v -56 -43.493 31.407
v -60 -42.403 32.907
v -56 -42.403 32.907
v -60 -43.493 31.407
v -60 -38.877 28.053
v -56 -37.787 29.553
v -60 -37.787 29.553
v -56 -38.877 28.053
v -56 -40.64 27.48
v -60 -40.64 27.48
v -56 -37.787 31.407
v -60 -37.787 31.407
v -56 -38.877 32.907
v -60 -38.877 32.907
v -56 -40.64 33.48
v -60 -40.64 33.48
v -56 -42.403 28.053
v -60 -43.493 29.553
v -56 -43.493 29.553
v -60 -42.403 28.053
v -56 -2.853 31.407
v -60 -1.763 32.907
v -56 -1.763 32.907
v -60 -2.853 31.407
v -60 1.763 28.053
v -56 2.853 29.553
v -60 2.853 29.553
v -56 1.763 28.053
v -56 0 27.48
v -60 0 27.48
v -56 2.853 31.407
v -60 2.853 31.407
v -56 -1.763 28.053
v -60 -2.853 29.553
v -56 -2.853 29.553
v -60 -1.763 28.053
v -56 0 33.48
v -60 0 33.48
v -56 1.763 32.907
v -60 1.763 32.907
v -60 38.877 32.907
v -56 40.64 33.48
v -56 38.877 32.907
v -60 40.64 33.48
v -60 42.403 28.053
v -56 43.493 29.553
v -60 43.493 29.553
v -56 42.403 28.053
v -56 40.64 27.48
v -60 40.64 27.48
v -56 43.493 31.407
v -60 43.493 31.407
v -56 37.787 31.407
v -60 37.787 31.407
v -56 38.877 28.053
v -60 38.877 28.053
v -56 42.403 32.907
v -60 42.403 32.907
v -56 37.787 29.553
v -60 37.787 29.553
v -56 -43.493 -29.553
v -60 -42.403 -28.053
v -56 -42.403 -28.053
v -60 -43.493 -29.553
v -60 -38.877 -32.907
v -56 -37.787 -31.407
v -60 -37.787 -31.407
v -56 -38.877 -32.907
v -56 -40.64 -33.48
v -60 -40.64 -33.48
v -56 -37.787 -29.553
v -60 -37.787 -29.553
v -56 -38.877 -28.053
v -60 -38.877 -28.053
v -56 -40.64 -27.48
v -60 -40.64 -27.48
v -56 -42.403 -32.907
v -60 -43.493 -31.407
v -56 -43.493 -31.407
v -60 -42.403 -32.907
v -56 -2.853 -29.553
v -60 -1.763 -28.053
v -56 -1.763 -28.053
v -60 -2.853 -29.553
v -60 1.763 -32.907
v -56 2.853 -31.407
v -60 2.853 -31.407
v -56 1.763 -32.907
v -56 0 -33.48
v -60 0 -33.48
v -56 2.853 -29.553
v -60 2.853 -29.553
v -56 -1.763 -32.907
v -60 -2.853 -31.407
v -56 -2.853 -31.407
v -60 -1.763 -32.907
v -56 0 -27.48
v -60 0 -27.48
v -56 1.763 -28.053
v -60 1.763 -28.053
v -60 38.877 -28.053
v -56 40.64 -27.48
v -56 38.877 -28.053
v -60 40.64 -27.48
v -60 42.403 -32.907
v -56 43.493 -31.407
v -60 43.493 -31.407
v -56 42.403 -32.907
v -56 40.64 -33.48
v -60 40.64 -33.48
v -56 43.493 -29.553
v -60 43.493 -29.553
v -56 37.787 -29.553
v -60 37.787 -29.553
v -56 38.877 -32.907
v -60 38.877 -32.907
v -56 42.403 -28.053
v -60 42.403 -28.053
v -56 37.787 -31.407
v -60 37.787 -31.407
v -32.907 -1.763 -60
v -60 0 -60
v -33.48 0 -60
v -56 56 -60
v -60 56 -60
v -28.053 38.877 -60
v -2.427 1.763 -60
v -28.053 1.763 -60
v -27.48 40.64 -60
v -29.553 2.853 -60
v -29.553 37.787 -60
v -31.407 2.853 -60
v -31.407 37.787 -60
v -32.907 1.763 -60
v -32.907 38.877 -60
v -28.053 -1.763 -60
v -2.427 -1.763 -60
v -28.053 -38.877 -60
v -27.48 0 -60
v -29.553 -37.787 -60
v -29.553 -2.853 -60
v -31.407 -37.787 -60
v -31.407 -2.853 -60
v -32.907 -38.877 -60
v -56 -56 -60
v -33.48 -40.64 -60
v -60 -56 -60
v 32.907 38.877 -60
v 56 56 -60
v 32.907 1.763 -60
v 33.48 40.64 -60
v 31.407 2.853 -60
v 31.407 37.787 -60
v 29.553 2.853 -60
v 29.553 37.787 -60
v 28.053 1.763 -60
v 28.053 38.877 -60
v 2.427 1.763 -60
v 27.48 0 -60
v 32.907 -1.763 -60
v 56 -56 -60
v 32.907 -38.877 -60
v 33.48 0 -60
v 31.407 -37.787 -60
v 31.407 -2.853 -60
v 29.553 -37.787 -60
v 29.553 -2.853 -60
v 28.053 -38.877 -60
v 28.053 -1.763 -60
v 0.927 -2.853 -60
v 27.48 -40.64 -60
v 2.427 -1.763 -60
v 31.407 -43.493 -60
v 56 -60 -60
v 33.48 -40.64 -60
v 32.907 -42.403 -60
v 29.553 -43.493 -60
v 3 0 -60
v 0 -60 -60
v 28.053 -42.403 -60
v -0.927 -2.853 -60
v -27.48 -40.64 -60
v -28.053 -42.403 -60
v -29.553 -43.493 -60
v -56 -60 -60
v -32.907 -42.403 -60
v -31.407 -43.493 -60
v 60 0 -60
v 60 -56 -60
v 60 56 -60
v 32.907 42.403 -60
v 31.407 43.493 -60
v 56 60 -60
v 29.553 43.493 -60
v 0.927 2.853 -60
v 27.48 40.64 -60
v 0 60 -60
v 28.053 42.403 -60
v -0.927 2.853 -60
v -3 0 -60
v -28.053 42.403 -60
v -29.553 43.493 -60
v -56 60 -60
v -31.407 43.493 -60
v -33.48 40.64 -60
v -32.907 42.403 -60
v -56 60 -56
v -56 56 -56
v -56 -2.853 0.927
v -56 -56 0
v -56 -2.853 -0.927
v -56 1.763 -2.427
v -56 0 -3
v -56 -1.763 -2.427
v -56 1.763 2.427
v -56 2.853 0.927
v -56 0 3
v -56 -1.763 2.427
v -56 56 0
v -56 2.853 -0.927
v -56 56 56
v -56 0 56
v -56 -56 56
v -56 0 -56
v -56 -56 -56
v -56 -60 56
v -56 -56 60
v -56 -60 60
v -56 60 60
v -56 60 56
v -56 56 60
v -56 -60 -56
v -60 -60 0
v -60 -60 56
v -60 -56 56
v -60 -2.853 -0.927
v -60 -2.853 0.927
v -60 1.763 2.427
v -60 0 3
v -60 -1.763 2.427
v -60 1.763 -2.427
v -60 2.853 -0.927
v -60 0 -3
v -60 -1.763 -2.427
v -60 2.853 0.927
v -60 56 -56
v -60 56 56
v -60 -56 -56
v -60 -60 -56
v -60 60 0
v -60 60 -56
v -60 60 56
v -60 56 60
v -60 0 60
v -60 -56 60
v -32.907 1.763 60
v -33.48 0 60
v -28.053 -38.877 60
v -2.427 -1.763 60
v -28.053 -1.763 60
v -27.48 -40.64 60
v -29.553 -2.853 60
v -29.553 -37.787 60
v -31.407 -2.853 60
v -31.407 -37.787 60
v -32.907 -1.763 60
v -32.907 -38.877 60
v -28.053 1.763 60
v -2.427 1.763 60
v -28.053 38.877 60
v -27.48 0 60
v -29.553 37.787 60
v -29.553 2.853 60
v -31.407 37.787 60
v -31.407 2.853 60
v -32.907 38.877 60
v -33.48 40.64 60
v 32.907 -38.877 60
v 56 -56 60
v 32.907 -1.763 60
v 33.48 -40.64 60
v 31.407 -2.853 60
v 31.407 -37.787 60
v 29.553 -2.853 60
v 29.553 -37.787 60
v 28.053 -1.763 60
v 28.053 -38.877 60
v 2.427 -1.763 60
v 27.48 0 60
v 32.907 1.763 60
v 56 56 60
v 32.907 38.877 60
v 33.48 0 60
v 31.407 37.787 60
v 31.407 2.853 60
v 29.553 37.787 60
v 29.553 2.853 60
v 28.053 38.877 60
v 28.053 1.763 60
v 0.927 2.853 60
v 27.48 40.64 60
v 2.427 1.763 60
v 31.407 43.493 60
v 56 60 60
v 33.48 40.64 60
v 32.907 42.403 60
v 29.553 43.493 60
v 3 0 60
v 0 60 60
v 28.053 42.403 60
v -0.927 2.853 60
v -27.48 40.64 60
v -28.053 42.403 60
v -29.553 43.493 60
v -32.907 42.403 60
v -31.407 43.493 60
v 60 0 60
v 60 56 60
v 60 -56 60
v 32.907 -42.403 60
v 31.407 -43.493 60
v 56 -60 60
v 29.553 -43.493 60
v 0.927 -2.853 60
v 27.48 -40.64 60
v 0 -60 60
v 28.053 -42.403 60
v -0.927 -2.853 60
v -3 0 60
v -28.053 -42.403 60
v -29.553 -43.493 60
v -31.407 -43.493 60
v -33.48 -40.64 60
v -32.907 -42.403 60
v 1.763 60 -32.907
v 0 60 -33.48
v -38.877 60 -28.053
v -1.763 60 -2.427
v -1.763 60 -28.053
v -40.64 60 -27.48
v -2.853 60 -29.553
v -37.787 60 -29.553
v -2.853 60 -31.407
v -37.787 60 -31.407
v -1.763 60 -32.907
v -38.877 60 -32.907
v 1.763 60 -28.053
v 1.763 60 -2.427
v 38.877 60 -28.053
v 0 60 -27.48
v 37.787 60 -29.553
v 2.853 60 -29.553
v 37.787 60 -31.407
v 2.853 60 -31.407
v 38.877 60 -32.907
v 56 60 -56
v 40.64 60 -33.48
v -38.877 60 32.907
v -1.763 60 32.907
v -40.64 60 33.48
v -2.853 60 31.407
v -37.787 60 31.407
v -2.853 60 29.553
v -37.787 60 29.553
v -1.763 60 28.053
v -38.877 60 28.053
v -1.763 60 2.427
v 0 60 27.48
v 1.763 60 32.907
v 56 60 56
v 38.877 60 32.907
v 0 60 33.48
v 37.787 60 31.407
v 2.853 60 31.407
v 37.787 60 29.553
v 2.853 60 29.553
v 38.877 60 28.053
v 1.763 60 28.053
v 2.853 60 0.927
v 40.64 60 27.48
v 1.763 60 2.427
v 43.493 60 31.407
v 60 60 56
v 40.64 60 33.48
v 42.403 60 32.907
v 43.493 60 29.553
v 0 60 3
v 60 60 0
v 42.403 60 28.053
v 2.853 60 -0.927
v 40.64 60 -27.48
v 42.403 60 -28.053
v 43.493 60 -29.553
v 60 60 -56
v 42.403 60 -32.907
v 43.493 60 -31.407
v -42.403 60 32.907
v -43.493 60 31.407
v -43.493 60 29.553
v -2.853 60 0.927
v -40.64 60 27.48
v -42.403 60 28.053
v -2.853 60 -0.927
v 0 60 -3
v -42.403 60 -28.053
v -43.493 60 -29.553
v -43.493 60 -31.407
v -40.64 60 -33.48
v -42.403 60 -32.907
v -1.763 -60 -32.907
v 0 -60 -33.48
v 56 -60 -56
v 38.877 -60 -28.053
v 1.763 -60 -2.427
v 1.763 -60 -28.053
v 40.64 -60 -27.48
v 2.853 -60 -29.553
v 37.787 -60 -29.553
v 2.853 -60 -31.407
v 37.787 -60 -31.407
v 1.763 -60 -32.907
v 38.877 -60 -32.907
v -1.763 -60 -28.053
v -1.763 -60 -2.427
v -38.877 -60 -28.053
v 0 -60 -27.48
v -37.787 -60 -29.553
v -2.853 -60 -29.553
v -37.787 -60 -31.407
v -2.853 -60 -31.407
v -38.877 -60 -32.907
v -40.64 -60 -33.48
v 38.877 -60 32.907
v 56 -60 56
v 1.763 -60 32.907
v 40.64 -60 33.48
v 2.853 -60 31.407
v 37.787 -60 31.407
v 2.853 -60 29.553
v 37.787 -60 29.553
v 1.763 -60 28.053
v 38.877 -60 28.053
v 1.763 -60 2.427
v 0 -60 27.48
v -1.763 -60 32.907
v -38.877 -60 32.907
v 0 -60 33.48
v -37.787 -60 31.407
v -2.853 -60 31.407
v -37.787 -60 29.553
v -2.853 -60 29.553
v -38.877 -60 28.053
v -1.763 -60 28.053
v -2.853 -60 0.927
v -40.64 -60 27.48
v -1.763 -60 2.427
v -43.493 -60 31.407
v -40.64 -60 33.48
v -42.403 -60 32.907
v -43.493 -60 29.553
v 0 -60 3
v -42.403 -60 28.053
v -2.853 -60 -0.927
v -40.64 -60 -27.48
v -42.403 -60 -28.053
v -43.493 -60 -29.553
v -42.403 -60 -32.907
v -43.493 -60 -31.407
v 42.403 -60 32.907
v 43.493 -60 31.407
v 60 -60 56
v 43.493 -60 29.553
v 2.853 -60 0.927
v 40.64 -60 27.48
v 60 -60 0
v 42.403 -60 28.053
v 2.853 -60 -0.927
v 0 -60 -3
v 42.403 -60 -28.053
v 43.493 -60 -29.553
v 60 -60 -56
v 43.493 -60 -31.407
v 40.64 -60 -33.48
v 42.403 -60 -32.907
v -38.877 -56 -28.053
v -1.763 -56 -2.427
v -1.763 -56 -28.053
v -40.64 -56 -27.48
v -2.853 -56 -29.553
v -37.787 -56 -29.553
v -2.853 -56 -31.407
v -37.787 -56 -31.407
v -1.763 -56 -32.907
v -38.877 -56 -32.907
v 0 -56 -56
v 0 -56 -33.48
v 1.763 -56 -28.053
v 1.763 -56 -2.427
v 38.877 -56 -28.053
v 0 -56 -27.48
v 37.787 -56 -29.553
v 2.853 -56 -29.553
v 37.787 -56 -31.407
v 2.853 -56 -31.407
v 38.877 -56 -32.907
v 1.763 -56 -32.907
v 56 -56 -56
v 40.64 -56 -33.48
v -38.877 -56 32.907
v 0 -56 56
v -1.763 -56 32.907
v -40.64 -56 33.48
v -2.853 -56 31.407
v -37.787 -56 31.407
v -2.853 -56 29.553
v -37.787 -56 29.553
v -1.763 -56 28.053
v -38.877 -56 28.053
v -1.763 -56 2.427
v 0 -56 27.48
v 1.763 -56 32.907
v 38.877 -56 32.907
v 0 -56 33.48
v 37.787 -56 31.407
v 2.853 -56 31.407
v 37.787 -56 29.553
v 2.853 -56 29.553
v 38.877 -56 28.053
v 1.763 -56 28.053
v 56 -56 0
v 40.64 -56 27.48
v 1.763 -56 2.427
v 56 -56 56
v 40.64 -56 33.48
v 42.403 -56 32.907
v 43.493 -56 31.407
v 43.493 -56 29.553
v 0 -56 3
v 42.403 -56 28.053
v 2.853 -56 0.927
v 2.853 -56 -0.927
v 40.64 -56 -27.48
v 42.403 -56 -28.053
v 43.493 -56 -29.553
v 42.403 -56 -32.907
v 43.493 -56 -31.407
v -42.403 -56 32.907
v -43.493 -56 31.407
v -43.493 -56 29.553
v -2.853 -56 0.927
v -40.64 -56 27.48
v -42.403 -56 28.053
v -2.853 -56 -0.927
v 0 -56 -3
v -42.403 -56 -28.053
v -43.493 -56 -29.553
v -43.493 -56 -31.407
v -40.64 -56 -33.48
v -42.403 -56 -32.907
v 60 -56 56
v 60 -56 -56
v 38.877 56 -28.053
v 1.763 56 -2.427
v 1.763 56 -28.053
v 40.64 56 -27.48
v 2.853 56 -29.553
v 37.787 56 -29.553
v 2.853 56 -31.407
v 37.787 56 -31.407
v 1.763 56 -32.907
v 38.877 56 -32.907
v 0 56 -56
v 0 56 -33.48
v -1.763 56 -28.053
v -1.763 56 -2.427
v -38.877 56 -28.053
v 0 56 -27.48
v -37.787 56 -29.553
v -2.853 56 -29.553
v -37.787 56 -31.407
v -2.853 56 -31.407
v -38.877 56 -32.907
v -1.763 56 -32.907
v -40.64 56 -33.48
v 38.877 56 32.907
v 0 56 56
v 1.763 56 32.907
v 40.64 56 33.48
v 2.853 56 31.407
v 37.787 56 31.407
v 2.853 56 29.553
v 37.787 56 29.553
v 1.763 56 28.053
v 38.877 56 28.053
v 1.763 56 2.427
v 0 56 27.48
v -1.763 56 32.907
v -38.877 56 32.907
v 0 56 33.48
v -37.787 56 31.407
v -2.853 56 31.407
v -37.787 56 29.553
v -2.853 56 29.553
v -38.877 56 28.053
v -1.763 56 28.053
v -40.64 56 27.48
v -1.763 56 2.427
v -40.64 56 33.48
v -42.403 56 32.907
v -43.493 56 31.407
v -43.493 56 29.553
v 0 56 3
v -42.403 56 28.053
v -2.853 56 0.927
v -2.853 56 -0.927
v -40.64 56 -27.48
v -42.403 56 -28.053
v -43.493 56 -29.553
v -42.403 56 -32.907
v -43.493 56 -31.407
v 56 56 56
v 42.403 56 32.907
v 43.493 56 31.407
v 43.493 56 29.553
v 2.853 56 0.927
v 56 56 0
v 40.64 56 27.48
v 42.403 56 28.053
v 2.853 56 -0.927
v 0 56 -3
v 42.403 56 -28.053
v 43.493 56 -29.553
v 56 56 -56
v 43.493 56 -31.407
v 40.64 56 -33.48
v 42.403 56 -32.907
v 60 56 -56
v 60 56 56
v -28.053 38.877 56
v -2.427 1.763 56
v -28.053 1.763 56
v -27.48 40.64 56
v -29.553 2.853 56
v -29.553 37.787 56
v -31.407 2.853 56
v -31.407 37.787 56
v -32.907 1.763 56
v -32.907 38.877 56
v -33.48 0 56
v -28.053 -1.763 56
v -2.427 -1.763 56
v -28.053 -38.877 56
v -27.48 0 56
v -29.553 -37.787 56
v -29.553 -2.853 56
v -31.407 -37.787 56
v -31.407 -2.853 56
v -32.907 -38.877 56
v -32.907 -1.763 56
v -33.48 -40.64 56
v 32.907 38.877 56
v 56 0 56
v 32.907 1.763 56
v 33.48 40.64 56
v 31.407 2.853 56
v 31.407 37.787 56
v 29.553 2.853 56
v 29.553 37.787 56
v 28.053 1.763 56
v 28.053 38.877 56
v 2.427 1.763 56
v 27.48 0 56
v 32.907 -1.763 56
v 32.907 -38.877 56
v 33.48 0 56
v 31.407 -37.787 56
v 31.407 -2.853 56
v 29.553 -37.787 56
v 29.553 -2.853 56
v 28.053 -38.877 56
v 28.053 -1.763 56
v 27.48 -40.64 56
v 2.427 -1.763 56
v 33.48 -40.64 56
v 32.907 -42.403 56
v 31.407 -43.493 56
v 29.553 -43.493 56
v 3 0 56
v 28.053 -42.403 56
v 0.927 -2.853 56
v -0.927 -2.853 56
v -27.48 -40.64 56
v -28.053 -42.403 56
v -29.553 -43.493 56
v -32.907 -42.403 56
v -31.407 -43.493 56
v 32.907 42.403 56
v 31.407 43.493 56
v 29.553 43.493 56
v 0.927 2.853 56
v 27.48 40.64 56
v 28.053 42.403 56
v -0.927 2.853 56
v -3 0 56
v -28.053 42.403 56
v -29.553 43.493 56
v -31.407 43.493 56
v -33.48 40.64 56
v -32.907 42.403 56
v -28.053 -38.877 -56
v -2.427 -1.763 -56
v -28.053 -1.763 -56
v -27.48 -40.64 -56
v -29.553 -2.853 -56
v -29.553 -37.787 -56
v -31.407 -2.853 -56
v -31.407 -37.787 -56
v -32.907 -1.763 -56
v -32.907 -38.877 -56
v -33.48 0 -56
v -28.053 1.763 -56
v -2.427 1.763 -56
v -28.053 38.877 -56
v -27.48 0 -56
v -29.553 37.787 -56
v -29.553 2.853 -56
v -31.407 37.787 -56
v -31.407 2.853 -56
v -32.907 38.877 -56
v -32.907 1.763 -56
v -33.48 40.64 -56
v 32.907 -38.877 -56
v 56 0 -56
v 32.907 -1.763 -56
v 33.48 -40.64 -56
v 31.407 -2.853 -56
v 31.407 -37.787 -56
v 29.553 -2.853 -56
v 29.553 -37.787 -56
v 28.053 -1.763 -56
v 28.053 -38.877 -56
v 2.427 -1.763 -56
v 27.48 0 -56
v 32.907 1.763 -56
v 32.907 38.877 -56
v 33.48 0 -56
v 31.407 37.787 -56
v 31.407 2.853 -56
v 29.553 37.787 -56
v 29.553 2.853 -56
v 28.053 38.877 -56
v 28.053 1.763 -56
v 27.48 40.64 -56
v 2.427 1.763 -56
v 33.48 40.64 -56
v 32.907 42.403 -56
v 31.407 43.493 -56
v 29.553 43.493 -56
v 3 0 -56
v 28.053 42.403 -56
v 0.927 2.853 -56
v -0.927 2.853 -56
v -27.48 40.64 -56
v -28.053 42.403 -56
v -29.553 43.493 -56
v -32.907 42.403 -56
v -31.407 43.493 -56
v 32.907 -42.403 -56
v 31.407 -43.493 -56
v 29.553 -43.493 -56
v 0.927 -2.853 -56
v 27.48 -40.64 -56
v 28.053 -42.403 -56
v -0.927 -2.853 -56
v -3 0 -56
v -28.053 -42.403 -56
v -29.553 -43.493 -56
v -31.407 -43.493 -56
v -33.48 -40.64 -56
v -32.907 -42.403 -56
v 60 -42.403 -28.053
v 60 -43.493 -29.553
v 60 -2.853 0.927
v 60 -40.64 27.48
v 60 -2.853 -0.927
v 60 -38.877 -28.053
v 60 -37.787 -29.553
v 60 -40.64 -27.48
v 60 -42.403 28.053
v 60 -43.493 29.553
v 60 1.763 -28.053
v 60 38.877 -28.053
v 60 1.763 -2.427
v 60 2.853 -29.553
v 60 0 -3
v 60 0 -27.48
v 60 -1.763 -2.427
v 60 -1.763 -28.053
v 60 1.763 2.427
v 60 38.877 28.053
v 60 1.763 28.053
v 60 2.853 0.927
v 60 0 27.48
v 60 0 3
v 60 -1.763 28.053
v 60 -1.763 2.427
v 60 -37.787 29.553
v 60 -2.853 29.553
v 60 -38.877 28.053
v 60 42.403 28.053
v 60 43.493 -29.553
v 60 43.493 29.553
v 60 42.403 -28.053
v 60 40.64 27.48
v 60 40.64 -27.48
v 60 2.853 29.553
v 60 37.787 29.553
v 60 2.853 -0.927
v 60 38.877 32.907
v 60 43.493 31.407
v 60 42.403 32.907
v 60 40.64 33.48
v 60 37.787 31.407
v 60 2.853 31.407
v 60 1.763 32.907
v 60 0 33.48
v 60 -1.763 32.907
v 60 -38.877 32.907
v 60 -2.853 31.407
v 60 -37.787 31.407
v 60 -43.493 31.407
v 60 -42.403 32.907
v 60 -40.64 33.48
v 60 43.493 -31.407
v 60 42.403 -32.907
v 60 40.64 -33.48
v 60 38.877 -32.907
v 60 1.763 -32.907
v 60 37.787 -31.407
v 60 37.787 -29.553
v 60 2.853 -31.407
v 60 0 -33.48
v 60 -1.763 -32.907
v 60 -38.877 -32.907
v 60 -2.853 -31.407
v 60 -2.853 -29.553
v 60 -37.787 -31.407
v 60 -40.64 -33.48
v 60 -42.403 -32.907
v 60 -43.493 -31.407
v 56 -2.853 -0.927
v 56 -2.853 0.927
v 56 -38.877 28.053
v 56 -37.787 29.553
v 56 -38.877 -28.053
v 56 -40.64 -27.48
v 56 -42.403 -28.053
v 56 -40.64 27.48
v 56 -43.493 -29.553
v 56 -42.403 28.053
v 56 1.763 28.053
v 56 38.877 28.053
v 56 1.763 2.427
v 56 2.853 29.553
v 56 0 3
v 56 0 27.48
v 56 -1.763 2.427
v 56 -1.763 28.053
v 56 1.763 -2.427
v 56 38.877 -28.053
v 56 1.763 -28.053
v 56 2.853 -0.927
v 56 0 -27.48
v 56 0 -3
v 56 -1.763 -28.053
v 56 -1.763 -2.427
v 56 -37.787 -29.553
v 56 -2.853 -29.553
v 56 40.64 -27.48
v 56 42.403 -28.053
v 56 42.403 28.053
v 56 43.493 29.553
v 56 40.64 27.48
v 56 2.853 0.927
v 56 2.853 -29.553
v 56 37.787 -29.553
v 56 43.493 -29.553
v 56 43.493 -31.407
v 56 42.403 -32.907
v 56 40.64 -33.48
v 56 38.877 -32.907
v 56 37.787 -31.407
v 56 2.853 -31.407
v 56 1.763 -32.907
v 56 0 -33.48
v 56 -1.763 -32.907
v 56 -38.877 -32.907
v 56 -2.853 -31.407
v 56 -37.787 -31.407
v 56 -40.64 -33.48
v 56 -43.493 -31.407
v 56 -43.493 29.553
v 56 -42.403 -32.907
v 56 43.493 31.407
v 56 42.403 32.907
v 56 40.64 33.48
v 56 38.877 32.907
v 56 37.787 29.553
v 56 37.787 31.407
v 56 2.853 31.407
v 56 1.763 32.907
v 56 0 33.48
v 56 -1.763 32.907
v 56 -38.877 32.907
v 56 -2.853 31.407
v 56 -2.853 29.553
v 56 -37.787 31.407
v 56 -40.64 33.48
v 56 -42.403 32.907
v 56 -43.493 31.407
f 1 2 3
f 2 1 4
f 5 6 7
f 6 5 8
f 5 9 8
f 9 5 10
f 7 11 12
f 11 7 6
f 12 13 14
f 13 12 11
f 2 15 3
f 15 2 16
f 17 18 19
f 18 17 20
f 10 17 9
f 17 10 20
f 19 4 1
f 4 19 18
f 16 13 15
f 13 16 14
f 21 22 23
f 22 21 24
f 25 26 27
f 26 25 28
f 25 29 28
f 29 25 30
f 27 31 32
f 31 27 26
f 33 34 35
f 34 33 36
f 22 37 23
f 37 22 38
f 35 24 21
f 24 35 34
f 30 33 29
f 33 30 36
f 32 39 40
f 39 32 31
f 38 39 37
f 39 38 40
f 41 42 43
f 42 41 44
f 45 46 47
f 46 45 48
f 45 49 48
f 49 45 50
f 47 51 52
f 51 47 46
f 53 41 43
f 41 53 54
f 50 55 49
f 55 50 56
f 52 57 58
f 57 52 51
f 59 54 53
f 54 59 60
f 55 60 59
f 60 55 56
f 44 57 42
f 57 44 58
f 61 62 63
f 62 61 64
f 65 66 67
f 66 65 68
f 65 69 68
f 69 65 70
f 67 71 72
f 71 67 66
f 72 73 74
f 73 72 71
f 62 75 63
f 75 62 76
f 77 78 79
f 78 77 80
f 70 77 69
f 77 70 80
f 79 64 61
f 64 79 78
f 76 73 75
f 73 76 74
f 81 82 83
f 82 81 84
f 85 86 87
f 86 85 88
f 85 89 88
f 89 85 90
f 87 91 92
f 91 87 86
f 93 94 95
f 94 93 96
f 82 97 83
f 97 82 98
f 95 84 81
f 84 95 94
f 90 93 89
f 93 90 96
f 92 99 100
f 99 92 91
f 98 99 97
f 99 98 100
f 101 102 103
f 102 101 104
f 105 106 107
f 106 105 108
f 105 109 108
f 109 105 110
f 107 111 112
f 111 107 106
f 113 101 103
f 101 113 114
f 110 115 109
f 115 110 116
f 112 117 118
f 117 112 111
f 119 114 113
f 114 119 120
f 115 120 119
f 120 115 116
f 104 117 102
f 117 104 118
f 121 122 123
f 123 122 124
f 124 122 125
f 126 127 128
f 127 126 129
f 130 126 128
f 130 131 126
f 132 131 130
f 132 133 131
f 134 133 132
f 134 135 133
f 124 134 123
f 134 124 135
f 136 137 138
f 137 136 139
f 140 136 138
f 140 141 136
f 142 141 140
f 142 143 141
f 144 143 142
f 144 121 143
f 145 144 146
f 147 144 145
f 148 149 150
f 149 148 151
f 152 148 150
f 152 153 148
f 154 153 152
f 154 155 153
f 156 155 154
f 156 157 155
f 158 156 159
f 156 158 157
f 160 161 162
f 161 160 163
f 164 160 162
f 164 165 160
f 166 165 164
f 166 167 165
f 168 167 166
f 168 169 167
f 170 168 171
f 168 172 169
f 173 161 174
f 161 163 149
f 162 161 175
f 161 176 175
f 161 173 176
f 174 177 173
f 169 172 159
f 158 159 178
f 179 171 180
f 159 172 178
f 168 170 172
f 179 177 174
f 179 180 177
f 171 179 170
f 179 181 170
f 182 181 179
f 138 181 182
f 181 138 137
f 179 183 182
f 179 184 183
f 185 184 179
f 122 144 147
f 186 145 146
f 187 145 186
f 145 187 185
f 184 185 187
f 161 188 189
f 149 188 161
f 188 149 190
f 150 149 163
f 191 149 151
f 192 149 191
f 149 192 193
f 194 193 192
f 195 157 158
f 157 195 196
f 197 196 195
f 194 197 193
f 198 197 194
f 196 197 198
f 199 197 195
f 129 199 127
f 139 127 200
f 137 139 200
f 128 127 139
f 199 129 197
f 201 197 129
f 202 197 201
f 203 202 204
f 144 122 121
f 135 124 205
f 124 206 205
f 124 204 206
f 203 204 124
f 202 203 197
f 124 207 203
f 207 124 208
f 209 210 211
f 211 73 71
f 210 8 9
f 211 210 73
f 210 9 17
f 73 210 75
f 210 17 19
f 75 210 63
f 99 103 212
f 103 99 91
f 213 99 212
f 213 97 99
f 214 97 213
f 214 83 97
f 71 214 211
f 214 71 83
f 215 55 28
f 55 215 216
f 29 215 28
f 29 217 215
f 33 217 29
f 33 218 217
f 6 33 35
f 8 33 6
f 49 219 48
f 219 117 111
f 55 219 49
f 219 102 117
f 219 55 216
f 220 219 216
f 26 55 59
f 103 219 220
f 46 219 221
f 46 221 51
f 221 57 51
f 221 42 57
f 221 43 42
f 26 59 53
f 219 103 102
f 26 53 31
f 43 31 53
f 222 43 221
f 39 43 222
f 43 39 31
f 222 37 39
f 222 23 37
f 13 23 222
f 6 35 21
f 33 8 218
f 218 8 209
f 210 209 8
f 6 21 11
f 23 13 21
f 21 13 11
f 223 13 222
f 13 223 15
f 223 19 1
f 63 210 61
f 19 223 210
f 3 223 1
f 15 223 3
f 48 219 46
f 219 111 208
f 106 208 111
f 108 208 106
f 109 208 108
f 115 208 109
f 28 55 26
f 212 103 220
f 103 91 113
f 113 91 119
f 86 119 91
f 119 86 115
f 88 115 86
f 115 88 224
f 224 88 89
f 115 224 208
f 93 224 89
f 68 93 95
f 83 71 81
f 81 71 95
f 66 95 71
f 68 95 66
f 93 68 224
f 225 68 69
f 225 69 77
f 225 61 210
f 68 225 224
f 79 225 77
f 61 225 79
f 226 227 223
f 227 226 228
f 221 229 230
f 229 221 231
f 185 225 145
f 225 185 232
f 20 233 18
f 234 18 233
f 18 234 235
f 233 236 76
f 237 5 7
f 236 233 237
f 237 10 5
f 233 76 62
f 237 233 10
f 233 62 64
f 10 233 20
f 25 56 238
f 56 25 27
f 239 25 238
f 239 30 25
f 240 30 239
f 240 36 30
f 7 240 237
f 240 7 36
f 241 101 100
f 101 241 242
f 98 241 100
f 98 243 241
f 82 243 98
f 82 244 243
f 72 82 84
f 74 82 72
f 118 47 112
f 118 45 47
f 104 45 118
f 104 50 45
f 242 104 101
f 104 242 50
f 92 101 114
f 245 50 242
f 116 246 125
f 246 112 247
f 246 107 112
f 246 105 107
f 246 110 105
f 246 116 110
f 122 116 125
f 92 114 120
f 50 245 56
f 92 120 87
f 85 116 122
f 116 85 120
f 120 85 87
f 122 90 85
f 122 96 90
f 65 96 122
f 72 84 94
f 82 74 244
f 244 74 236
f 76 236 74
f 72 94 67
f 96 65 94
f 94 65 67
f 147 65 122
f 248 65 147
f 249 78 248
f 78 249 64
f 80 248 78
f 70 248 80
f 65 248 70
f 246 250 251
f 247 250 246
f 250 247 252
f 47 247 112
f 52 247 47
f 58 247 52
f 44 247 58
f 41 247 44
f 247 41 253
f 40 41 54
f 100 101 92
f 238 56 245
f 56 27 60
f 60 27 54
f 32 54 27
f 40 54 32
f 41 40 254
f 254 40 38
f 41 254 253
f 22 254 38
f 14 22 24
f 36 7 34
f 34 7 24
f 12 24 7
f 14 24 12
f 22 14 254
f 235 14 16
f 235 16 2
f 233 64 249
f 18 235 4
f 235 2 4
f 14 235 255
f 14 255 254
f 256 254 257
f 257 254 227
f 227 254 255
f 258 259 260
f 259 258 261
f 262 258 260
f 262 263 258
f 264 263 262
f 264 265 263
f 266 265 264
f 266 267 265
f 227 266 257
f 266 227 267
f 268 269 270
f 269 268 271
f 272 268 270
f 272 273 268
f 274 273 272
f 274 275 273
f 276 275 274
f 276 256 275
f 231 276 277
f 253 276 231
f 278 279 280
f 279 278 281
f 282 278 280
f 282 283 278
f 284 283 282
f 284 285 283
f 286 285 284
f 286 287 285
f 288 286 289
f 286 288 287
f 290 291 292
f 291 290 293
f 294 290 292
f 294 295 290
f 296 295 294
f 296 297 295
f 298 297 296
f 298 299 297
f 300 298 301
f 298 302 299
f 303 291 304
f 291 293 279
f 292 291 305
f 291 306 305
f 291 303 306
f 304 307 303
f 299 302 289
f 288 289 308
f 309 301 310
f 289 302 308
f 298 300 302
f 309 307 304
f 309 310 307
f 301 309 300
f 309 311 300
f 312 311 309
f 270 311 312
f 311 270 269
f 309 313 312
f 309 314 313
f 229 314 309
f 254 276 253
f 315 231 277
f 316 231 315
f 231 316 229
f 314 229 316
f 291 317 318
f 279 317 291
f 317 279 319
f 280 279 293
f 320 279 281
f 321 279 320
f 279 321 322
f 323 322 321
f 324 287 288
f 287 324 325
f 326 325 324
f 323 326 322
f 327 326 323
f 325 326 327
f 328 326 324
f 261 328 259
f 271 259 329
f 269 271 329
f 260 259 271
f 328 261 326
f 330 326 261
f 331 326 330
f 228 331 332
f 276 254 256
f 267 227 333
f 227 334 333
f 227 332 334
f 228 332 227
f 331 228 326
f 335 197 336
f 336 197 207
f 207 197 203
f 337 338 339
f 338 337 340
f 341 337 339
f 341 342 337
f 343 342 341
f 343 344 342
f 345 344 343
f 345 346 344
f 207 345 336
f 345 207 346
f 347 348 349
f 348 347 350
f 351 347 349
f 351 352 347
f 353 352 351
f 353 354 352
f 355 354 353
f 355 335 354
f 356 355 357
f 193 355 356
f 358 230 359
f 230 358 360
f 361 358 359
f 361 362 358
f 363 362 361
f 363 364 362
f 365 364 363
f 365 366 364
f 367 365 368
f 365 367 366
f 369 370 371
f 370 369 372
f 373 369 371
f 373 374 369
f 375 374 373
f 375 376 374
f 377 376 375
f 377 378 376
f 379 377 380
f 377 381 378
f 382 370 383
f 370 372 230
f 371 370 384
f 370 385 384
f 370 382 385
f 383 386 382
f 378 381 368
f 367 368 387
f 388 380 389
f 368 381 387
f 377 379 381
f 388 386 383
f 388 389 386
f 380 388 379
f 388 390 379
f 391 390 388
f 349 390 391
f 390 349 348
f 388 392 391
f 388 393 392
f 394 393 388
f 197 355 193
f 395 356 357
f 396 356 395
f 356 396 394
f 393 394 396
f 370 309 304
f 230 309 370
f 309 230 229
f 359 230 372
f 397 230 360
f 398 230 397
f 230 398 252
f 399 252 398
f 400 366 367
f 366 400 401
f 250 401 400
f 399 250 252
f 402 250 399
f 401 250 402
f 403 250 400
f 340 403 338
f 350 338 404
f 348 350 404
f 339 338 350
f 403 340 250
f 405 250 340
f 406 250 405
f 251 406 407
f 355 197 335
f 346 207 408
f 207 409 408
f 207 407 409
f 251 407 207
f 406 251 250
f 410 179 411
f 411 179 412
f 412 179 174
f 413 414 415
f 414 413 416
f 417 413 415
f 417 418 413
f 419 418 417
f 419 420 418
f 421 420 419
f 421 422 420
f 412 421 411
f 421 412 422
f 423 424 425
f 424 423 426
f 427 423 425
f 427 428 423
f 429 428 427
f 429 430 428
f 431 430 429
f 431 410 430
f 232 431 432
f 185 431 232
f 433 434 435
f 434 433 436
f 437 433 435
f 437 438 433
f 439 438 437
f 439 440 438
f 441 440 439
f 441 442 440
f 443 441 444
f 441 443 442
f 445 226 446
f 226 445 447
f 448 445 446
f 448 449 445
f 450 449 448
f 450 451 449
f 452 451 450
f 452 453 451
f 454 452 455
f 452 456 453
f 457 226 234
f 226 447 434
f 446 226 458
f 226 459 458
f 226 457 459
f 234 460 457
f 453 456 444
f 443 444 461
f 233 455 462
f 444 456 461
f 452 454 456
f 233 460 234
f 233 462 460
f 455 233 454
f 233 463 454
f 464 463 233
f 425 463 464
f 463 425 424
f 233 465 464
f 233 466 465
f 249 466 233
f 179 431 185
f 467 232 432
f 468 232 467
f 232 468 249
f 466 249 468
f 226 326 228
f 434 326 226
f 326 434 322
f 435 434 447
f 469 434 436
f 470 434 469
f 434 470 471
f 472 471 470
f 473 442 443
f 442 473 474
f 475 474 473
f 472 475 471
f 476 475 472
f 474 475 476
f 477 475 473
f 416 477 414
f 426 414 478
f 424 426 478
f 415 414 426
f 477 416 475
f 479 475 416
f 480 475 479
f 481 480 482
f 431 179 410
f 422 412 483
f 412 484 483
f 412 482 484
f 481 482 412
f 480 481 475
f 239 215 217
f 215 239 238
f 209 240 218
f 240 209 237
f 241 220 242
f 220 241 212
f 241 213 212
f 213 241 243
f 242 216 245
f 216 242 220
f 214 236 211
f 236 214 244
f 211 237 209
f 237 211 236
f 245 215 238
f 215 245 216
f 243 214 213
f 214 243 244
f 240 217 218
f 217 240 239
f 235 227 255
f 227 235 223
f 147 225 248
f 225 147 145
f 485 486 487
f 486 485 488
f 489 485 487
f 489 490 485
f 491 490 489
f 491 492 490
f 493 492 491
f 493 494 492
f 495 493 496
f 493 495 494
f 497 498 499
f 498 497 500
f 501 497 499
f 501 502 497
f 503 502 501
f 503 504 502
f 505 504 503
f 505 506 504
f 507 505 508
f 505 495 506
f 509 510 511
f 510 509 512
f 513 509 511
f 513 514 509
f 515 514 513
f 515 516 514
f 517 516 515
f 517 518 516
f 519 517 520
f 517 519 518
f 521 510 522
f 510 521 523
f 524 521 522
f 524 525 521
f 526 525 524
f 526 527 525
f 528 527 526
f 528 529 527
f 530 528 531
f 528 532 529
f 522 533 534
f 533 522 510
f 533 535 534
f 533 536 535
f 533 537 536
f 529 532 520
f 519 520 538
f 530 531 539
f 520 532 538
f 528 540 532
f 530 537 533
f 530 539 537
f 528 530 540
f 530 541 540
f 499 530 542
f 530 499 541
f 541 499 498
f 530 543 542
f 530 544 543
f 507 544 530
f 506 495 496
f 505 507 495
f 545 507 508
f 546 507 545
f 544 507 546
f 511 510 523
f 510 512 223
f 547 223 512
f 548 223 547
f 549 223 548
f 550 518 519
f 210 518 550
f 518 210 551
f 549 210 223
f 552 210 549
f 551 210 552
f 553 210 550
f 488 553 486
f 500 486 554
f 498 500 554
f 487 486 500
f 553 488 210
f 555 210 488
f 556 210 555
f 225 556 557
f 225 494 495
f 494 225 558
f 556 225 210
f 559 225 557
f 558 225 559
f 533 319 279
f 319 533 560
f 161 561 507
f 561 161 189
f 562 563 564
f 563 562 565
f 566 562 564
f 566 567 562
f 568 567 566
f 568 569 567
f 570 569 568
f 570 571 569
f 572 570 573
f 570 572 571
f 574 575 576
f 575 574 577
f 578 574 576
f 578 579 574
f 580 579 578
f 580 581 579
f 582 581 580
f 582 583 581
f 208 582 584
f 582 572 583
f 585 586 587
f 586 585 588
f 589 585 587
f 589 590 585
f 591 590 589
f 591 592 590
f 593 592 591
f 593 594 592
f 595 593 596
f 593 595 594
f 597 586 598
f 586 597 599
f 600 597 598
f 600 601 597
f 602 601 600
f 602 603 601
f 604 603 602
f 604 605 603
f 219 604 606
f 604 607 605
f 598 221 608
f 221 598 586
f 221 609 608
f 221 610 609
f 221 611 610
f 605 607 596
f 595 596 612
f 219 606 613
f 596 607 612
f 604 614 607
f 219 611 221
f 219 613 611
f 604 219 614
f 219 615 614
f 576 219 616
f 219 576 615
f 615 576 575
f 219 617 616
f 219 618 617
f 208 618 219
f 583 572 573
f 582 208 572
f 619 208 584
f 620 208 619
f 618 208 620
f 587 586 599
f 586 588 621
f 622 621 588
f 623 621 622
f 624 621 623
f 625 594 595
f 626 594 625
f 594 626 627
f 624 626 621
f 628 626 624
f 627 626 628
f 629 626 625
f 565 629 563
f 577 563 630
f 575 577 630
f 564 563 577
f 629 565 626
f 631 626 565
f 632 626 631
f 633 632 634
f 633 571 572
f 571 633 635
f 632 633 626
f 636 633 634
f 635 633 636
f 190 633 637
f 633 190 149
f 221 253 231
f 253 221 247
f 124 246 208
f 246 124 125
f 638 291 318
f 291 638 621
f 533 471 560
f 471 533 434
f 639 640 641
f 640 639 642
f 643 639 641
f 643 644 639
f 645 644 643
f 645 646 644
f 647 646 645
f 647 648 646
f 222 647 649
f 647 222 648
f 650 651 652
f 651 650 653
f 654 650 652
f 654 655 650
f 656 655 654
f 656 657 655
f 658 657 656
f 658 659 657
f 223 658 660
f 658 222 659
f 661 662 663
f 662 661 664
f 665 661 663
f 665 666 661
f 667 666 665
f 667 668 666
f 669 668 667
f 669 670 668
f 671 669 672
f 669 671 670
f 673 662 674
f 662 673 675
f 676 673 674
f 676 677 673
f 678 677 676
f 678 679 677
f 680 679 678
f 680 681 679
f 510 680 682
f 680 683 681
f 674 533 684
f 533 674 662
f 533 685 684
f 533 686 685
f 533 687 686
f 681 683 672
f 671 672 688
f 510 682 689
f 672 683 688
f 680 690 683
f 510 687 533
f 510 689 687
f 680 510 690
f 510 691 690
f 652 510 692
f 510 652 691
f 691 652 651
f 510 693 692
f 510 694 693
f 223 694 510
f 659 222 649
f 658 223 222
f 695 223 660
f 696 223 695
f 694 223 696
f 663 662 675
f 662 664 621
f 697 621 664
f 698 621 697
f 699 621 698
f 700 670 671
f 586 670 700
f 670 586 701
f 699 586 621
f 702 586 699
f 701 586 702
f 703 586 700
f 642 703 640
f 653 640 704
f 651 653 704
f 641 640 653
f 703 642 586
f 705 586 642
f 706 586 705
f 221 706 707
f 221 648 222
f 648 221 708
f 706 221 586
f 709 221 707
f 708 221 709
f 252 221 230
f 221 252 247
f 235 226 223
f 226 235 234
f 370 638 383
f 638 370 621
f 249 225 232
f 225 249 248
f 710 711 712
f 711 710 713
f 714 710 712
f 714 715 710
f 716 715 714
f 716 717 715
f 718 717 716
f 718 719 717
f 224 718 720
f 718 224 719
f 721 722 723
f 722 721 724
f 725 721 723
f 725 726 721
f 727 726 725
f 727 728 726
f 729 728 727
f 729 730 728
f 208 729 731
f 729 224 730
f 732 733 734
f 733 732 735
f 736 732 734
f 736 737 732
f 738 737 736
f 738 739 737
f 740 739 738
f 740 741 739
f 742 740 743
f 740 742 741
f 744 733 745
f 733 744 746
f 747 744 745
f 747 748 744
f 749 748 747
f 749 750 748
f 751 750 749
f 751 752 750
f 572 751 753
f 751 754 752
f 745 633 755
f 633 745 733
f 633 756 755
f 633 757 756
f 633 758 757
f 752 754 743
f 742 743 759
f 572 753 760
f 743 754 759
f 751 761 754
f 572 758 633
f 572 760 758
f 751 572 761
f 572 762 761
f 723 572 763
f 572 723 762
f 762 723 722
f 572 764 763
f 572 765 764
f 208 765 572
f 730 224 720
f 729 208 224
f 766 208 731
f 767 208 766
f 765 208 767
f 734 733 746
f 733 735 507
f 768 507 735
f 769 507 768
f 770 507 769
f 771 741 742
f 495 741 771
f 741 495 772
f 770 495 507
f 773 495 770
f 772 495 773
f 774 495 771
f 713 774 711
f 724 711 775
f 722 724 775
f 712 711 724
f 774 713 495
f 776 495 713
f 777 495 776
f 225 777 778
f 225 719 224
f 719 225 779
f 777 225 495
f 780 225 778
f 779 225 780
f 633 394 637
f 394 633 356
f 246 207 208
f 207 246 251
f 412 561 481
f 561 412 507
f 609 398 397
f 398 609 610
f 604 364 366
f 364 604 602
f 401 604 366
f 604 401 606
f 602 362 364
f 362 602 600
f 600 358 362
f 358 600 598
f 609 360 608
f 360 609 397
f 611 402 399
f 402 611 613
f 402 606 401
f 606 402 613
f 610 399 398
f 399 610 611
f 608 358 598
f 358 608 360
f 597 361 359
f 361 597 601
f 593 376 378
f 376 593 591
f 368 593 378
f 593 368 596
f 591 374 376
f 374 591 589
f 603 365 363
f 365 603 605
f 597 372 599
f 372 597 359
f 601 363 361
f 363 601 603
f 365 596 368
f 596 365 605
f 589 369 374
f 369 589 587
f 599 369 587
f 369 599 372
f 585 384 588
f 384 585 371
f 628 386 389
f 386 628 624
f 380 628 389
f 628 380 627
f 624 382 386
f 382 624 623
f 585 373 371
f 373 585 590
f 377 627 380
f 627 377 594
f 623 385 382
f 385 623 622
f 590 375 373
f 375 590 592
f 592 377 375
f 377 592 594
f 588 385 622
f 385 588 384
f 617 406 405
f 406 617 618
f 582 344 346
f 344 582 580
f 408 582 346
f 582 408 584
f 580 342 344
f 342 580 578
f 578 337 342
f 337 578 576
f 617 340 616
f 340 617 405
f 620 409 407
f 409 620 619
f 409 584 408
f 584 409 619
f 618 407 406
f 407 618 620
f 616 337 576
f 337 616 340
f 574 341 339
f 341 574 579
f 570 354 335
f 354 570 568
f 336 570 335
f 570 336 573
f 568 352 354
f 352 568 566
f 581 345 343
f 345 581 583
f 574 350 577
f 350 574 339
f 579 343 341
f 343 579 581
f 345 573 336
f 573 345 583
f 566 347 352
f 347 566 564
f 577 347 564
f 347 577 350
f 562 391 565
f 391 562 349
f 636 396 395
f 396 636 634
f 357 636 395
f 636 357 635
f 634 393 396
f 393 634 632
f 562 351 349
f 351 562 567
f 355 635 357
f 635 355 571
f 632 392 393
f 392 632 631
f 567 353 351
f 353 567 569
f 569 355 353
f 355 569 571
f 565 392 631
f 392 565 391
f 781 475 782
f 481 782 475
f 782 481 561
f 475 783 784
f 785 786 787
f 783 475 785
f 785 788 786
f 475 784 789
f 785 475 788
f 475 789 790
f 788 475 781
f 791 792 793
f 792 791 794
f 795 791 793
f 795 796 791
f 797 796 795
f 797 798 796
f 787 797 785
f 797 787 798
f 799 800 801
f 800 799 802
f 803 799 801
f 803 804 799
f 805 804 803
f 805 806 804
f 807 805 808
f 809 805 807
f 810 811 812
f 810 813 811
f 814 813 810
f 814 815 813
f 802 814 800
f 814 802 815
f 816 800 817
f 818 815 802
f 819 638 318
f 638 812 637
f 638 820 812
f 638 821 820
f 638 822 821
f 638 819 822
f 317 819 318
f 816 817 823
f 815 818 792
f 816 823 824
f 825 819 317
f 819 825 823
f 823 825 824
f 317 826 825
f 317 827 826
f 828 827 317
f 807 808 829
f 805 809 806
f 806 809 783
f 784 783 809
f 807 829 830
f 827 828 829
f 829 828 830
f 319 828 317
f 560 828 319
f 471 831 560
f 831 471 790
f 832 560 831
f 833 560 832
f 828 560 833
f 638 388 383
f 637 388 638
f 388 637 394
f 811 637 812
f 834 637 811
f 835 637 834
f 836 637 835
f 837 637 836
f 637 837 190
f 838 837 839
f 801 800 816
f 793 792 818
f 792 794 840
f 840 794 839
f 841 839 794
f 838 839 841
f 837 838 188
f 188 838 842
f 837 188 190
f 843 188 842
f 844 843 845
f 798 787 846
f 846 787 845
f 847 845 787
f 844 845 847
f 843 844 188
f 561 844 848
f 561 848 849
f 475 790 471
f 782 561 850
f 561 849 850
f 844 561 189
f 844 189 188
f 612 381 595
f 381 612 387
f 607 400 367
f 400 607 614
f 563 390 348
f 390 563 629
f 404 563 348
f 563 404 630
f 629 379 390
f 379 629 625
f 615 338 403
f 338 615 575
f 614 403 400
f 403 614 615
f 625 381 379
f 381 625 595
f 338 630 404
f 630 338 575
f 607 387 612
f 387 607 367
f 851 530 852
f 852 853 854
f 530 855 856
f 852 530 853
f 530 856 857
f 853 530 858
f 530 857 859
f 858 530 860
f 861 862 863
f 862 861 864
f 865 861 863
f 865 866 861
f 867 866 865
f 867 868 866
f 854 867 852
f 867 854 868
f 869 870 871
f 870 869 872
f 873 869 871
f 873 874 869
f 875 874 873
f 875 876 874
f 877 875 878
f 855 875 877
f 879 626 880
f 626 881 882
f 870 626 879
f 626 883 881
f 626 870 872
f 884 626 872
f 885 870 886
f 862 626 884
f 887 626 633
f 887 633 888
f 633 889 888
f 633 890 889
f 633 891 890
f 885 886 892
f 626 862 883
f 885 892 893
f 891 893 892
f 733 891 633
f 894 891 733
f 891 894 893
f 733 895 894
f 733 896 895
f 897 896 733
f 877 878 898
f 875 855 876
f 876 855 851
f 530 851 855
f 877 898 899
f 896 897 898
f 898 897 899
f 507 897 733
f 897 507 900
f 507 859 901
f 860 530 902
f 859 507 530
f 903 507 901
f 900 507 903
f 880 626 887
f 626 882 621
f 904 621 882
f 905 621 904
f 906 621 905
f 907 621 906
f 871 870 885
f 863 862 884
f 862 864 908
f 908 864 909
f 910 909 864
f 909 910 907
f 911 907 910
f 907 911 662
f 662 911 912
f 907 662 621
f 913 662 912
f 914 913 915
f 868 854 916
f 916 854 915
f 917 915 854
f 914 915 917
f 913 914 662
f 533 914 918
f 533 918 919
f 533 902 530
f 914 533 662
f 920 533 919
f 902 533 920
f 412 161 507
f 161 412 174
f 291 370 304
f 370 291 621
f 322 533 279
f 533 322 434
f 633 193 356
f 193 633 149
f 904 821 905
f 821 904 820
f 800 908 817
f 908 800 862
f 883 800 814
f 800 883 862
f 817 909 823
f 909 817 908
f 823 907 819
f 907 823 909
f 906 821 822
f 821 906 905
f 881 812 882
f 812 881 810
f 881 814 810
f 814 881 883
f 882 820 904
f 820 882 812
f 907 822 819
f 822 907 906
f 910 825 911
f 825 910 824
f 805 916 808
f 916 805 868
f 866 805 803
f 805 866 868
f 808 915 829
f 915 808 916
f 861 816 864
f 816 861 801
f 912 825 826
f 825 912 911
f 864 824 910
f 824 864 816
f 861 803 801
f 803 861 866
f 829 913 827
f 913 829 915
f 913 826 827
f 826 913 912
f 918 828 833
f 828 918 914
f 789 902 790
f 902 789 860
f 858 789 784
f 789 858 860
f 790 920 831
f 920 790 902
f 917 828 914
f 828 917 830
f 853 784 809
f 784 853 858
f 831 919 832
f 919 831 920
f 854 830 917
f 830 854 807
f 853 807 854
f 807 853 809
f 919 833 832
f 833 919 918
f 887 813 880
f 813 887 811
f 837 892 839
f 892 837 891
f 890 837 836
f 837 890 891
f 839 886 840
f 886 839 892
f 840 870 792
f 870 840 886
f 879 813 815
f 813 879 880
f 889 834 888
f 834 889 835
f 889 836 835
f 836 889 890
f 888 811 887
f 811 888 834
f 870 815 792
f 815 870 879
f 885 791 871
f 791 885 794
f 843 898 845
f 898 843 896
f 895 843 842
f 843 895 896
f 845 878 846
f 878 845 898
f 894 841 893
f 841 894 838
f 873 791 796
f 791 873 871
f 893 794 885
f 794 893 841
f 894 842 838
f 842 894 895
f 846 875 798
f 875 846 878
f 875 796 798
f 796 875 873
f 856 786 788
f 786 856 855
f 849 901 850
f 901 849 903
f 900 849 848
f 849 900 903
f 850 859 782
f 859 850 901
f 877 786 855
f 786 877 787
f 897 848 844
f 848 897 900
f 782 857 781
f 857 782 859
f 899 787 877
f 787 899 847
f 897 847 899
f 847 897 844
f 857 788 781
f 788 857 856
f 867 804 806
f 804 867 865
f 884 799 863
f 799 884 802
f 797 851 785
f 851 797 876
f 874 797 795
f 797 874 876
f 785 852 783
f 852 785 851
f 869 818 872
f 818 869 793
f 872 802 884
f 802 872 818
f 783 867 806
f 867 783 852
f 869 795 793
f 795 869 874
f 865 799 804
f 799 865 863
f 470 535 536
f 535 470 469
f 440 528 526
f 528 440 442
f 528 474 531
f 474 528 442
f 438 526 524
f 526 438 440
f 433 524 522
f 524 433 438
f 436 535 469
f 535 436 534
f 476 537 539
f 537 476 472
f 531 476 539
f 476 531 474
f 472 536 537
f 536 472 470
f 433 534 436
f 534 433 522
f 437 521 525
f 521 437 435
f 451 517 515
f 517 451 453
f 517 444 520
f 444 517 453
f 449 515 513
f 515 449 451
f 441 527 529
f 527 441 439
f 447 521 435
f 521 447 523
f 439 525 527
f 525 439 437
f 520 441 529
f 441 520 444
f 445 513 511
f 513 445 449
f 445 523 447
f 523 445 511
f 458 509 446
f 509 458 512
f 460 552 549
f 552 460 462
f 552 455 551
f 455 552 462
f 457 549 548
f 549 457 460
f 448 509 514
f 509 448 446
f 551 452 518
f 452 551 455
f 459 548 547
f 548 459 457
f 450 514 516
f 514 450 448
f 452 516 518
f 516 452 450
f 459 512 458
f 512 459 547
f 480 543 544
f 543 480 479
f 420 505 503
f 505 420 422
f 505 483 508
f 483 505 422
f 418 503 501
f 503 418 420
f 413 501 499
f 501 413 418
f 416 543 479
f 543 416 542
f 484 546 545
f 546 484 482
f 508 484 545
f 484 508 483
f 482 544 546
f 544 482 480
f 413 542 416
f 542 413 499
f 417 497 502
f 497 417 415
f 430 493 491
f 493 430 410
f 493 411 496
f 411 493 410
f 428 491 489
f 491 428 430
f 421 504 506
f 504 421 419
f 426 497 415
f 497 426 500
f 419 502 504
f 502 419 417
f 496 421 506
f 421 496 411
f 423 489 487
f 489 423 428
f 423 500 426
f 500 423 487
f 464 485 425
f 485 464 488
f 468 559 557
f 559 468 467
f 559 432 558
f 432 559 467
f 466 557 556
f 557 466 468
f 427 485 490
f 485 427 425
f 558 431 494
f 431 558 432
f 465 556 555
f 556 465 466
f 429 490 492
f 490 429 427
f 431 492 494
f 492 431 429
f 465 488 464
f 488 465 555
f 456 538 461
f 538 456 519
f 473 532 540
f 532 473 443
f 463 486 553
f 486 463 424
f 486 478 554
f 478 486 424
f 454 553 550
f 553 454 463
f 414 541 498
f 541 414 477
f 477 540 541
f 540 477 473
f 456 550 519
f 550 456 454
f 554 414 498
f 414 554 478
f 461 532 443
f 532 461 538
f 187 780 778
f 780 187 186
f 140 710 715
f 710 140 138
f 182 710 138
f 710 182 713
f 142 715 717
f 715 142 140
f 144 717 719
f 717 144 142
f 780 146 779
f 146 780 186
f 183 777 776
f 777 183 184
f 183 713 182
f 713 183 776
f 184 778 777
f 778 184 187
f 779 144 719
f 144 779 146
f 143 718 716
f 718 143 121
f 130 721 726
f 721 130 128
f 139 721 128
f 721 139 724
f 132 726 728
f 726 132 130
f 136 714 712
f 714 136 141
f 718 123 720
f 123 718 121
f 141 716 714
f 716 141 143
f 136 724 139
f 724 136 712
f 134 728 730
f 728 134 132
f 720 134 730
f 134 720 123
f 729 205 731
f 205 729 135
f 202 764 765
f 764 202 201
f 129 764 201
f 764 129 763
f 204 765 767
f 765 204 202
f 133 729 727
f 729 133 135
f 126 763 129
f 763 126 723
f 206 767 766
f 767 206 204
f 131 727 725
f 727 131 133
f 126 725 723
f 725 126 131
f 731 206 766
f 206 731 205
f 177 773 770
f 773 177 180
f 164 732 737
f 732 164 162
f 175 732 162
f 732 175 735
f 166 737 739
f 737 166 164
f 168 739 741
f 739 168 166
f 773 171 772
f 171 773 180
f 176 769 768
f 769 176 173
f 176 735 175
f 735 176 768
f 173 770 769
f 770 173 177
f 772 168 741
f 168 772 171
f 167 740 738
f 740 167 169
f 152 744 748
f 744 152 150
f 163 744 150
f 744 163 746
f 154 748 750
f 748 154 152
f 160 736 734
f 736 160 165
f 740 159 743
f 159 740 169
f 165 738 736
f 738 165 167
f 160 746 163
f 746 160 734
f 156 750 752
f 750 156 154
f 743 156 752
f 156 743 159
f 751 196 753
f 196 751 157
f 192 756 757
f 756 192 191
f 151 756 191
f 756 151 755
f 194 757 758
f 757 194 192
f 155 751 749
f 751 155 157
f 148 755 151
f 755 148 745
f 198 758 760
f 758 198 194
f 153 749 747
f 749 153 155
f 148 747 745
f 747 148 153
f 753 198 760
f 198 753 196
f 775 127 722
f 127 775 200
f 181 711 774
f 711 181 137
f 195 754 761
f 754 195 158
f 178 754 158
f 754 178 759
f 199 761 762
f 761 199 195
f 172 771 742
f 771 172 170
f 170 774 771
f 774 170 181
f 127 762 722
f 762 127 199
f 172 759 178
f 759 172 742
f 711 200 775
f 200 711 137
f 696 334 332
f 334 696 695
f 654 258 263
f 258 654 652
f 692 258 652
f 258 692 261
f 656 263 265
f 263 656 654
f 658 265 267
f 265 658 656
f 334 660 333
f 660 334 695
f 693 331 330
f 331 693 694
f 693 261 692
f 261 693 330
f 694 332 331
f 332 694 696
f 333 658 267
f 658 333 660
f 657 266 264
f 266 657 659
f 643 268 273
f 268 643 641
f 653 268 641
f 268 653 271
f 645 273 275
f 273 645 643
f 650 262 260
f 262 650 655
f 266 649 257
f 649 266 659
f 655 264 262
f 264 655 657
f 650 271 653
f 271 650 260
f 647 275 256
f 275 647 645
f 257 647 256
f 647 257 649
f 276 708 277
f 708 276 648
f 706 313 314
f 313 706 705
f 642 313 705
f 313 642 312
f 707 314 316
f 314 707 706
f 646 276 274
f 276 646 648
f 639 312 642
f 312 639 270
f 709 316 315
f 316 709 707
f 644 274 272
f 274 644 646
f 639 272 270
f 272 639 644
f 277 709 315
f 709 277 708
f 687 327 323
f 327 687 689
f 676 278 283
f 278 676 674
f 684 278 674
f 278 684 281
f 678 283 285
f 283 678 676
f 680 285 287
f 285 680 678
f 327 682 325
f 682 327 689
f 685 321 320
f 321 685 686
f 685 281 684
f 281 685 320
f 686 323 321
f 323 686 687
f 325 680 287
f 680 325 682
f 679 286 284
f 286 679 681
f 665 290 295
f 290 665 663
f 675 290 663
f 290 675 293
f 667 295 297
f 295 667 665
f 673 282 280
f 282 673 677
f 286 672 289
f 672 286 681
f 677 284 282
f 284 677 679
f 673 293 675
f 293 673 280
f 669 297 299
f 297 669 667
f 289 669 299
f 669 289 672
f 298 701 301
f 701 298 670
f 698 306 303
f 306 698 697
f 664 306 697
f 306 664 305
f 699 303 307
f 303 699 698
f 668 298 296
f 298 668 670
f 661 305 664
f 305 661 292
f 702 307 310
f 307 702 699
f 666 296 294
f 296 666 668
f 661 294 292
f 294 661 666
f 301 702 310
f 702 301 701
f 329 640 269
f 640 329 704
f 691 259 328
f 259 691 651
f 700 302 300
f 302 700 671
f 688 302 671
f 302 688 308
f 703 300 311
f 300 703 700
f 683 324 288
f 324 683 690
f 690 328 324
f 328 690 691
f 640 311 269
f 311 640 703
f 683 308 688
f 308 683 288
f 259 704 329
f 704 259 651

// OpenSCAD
cube_side_length = 120;
nose_length = 60;
case_thickness = 4;
pcb_length = 100;
hole_radius = 3;

explode = 0; //15;

pcb_length = 100;
pcb_thickness = 1;
pcb_grid = 2.54;

parts_laser_offset = cube_side_length + 10;


union() {
//intersection() {
	cube_sides();

	cube_bottom();

	cube_top();

//	pcb();
}


/*
projection()
	laser_cut_parts();
*/

module laser_cut_parts() {
	translate([0, 0, cube_side_length/2+explode-case_thickness/2])
		cube_side();
	translate([parts_laser_offset, 0, cube_side_length/2+explode-case_thickness/2])
		cube_side();
	translate([parts_laser_offset*2, 0, cube_side_length/2+explode-case_thickness/2])
		cube_side();
	translate([parts_laser_offset*0, parts_laser_offset, cube_side_length/2+explode-case_thickness/2])
		cube_side();
	translate([parts_laser_offset*1, parts_laser_offset, -cube_side_length/2-explode+case_thickness/2])
		cube_top();
	translate([parts_laser_offset*2, parts_laser_offset, cube_side_length/2+explode-case_thickness/2])
		cube_bottom();
}


module cube_sides() {
	for(i = [0:90:270]) {
		rotate([i,90,0])
			cube_side();
	}
}

module cube_side() {
	translate([-cube_side_length/2,-cube_side_length/2,-cube_side_length/2-explode])			difference() {
		part();

		nose_x();
/*		translate([(cube_side_length-nose_length), 0, 0])
			nose_x();
*/
		translate([nose_length, cube_side_length- case_thickness, 0])
			nose_x();


		translate([case_thickness, nose_length, 0])
			nose_y();


		translate([cube_side_length, 0, 0])
			nose_y();
/*		translate([cube_side_length, cube_side_length-nose_length, 0])
			nose_y();*/

	}
}

module cube_bottom() {
	translate([-cube_side_length/2,-cube_side_length/2,-cube_side_length/2-explode])
	
	difference() {
		part();

/*		translate([nose_length, 0, 0])
			nose_x();*/
		translate([0, 0, 0])
			nose_x();

		translate([nose_length, cube_side_length-case_thickness, 0])
			nose_x();

		translate([case_thickness, nose_length, 0])
			nose_y();
	
/*		translate([cube_side_length, nose_length, 0])
			nose_y();*/
		translate([cube_side_length, 0, 0])
			nose_y();
	}
}

module cube_top() {
	translate([-cube_side_length/2,-cube_side_length/2,cube_side_length/2-case_thickness+explode])

	difference() {
		part();

/*		nose_x();*/
		translate([(cube_side_length-nose_length), 0, 0])
			nose_x();

		translate([0, cube_side_length- case_thickness, 0])
			nose_x();
/*		translate([cube_side_length-nose_length, cube_side_length- case_thickness, 0])
			nose_x();*/

		translate([case_thickness, 0, 0])
			nose_y();

/*		translate([case_thickness, cube_side_length-nose_length, 0])
			nose_y();*/

/*		translate([cube_side_length, 0, 0])
			nose_y();*/

		translate([cube_side_length, cube_side_length-nose_length, 0])
			nose_y();
	}
}

module nose_x() {
	cube([nose_length, case_thickness, case_thickness]);
}

module nose_y() {
	translate([-case_thickness,0,0])
		cube([case_thickness, nose_length, case_thickness]);
}

module part() {
	difference() {
		cube([cube_side_length, cube_side_length, case_thickness]);

		for(x=[29.52:2.54*24:90.48]) {
			for(y=[19.36:2.54*16:100.64]) {
				translate([x, y, 0])
					hole();
			}
		}
		translate([cube_side_length/2, cube_side_length/2, 0])
			hole();
	}
}

module hole() {
	translate([0,0,case_thickness/2])
		cylinder(h=case_thickness*2, r=hole_radius, center=true, $fns=20);
}

module pcb() {
	translate([-pcb_length/2,-pcb_length/2,-pcb_length/2-explode])
	difference() {

		cube([pcb_length, pcb_length, pcb_thickness]);

		for(x=[1:39]) {
			for(y=[1:39]) {
				translate([x*pcb_grid-0.8, y*pcb_grid-0.8, 0])
					translate([0,0,case_thickness/2])
						cylinder(h=case_thickness*2, r=1, center=true, $fns=3);
			}
		}
		translate([cube_side_length/4*2, cube_side_length/6*3, 0])
			hole();
	}
}
